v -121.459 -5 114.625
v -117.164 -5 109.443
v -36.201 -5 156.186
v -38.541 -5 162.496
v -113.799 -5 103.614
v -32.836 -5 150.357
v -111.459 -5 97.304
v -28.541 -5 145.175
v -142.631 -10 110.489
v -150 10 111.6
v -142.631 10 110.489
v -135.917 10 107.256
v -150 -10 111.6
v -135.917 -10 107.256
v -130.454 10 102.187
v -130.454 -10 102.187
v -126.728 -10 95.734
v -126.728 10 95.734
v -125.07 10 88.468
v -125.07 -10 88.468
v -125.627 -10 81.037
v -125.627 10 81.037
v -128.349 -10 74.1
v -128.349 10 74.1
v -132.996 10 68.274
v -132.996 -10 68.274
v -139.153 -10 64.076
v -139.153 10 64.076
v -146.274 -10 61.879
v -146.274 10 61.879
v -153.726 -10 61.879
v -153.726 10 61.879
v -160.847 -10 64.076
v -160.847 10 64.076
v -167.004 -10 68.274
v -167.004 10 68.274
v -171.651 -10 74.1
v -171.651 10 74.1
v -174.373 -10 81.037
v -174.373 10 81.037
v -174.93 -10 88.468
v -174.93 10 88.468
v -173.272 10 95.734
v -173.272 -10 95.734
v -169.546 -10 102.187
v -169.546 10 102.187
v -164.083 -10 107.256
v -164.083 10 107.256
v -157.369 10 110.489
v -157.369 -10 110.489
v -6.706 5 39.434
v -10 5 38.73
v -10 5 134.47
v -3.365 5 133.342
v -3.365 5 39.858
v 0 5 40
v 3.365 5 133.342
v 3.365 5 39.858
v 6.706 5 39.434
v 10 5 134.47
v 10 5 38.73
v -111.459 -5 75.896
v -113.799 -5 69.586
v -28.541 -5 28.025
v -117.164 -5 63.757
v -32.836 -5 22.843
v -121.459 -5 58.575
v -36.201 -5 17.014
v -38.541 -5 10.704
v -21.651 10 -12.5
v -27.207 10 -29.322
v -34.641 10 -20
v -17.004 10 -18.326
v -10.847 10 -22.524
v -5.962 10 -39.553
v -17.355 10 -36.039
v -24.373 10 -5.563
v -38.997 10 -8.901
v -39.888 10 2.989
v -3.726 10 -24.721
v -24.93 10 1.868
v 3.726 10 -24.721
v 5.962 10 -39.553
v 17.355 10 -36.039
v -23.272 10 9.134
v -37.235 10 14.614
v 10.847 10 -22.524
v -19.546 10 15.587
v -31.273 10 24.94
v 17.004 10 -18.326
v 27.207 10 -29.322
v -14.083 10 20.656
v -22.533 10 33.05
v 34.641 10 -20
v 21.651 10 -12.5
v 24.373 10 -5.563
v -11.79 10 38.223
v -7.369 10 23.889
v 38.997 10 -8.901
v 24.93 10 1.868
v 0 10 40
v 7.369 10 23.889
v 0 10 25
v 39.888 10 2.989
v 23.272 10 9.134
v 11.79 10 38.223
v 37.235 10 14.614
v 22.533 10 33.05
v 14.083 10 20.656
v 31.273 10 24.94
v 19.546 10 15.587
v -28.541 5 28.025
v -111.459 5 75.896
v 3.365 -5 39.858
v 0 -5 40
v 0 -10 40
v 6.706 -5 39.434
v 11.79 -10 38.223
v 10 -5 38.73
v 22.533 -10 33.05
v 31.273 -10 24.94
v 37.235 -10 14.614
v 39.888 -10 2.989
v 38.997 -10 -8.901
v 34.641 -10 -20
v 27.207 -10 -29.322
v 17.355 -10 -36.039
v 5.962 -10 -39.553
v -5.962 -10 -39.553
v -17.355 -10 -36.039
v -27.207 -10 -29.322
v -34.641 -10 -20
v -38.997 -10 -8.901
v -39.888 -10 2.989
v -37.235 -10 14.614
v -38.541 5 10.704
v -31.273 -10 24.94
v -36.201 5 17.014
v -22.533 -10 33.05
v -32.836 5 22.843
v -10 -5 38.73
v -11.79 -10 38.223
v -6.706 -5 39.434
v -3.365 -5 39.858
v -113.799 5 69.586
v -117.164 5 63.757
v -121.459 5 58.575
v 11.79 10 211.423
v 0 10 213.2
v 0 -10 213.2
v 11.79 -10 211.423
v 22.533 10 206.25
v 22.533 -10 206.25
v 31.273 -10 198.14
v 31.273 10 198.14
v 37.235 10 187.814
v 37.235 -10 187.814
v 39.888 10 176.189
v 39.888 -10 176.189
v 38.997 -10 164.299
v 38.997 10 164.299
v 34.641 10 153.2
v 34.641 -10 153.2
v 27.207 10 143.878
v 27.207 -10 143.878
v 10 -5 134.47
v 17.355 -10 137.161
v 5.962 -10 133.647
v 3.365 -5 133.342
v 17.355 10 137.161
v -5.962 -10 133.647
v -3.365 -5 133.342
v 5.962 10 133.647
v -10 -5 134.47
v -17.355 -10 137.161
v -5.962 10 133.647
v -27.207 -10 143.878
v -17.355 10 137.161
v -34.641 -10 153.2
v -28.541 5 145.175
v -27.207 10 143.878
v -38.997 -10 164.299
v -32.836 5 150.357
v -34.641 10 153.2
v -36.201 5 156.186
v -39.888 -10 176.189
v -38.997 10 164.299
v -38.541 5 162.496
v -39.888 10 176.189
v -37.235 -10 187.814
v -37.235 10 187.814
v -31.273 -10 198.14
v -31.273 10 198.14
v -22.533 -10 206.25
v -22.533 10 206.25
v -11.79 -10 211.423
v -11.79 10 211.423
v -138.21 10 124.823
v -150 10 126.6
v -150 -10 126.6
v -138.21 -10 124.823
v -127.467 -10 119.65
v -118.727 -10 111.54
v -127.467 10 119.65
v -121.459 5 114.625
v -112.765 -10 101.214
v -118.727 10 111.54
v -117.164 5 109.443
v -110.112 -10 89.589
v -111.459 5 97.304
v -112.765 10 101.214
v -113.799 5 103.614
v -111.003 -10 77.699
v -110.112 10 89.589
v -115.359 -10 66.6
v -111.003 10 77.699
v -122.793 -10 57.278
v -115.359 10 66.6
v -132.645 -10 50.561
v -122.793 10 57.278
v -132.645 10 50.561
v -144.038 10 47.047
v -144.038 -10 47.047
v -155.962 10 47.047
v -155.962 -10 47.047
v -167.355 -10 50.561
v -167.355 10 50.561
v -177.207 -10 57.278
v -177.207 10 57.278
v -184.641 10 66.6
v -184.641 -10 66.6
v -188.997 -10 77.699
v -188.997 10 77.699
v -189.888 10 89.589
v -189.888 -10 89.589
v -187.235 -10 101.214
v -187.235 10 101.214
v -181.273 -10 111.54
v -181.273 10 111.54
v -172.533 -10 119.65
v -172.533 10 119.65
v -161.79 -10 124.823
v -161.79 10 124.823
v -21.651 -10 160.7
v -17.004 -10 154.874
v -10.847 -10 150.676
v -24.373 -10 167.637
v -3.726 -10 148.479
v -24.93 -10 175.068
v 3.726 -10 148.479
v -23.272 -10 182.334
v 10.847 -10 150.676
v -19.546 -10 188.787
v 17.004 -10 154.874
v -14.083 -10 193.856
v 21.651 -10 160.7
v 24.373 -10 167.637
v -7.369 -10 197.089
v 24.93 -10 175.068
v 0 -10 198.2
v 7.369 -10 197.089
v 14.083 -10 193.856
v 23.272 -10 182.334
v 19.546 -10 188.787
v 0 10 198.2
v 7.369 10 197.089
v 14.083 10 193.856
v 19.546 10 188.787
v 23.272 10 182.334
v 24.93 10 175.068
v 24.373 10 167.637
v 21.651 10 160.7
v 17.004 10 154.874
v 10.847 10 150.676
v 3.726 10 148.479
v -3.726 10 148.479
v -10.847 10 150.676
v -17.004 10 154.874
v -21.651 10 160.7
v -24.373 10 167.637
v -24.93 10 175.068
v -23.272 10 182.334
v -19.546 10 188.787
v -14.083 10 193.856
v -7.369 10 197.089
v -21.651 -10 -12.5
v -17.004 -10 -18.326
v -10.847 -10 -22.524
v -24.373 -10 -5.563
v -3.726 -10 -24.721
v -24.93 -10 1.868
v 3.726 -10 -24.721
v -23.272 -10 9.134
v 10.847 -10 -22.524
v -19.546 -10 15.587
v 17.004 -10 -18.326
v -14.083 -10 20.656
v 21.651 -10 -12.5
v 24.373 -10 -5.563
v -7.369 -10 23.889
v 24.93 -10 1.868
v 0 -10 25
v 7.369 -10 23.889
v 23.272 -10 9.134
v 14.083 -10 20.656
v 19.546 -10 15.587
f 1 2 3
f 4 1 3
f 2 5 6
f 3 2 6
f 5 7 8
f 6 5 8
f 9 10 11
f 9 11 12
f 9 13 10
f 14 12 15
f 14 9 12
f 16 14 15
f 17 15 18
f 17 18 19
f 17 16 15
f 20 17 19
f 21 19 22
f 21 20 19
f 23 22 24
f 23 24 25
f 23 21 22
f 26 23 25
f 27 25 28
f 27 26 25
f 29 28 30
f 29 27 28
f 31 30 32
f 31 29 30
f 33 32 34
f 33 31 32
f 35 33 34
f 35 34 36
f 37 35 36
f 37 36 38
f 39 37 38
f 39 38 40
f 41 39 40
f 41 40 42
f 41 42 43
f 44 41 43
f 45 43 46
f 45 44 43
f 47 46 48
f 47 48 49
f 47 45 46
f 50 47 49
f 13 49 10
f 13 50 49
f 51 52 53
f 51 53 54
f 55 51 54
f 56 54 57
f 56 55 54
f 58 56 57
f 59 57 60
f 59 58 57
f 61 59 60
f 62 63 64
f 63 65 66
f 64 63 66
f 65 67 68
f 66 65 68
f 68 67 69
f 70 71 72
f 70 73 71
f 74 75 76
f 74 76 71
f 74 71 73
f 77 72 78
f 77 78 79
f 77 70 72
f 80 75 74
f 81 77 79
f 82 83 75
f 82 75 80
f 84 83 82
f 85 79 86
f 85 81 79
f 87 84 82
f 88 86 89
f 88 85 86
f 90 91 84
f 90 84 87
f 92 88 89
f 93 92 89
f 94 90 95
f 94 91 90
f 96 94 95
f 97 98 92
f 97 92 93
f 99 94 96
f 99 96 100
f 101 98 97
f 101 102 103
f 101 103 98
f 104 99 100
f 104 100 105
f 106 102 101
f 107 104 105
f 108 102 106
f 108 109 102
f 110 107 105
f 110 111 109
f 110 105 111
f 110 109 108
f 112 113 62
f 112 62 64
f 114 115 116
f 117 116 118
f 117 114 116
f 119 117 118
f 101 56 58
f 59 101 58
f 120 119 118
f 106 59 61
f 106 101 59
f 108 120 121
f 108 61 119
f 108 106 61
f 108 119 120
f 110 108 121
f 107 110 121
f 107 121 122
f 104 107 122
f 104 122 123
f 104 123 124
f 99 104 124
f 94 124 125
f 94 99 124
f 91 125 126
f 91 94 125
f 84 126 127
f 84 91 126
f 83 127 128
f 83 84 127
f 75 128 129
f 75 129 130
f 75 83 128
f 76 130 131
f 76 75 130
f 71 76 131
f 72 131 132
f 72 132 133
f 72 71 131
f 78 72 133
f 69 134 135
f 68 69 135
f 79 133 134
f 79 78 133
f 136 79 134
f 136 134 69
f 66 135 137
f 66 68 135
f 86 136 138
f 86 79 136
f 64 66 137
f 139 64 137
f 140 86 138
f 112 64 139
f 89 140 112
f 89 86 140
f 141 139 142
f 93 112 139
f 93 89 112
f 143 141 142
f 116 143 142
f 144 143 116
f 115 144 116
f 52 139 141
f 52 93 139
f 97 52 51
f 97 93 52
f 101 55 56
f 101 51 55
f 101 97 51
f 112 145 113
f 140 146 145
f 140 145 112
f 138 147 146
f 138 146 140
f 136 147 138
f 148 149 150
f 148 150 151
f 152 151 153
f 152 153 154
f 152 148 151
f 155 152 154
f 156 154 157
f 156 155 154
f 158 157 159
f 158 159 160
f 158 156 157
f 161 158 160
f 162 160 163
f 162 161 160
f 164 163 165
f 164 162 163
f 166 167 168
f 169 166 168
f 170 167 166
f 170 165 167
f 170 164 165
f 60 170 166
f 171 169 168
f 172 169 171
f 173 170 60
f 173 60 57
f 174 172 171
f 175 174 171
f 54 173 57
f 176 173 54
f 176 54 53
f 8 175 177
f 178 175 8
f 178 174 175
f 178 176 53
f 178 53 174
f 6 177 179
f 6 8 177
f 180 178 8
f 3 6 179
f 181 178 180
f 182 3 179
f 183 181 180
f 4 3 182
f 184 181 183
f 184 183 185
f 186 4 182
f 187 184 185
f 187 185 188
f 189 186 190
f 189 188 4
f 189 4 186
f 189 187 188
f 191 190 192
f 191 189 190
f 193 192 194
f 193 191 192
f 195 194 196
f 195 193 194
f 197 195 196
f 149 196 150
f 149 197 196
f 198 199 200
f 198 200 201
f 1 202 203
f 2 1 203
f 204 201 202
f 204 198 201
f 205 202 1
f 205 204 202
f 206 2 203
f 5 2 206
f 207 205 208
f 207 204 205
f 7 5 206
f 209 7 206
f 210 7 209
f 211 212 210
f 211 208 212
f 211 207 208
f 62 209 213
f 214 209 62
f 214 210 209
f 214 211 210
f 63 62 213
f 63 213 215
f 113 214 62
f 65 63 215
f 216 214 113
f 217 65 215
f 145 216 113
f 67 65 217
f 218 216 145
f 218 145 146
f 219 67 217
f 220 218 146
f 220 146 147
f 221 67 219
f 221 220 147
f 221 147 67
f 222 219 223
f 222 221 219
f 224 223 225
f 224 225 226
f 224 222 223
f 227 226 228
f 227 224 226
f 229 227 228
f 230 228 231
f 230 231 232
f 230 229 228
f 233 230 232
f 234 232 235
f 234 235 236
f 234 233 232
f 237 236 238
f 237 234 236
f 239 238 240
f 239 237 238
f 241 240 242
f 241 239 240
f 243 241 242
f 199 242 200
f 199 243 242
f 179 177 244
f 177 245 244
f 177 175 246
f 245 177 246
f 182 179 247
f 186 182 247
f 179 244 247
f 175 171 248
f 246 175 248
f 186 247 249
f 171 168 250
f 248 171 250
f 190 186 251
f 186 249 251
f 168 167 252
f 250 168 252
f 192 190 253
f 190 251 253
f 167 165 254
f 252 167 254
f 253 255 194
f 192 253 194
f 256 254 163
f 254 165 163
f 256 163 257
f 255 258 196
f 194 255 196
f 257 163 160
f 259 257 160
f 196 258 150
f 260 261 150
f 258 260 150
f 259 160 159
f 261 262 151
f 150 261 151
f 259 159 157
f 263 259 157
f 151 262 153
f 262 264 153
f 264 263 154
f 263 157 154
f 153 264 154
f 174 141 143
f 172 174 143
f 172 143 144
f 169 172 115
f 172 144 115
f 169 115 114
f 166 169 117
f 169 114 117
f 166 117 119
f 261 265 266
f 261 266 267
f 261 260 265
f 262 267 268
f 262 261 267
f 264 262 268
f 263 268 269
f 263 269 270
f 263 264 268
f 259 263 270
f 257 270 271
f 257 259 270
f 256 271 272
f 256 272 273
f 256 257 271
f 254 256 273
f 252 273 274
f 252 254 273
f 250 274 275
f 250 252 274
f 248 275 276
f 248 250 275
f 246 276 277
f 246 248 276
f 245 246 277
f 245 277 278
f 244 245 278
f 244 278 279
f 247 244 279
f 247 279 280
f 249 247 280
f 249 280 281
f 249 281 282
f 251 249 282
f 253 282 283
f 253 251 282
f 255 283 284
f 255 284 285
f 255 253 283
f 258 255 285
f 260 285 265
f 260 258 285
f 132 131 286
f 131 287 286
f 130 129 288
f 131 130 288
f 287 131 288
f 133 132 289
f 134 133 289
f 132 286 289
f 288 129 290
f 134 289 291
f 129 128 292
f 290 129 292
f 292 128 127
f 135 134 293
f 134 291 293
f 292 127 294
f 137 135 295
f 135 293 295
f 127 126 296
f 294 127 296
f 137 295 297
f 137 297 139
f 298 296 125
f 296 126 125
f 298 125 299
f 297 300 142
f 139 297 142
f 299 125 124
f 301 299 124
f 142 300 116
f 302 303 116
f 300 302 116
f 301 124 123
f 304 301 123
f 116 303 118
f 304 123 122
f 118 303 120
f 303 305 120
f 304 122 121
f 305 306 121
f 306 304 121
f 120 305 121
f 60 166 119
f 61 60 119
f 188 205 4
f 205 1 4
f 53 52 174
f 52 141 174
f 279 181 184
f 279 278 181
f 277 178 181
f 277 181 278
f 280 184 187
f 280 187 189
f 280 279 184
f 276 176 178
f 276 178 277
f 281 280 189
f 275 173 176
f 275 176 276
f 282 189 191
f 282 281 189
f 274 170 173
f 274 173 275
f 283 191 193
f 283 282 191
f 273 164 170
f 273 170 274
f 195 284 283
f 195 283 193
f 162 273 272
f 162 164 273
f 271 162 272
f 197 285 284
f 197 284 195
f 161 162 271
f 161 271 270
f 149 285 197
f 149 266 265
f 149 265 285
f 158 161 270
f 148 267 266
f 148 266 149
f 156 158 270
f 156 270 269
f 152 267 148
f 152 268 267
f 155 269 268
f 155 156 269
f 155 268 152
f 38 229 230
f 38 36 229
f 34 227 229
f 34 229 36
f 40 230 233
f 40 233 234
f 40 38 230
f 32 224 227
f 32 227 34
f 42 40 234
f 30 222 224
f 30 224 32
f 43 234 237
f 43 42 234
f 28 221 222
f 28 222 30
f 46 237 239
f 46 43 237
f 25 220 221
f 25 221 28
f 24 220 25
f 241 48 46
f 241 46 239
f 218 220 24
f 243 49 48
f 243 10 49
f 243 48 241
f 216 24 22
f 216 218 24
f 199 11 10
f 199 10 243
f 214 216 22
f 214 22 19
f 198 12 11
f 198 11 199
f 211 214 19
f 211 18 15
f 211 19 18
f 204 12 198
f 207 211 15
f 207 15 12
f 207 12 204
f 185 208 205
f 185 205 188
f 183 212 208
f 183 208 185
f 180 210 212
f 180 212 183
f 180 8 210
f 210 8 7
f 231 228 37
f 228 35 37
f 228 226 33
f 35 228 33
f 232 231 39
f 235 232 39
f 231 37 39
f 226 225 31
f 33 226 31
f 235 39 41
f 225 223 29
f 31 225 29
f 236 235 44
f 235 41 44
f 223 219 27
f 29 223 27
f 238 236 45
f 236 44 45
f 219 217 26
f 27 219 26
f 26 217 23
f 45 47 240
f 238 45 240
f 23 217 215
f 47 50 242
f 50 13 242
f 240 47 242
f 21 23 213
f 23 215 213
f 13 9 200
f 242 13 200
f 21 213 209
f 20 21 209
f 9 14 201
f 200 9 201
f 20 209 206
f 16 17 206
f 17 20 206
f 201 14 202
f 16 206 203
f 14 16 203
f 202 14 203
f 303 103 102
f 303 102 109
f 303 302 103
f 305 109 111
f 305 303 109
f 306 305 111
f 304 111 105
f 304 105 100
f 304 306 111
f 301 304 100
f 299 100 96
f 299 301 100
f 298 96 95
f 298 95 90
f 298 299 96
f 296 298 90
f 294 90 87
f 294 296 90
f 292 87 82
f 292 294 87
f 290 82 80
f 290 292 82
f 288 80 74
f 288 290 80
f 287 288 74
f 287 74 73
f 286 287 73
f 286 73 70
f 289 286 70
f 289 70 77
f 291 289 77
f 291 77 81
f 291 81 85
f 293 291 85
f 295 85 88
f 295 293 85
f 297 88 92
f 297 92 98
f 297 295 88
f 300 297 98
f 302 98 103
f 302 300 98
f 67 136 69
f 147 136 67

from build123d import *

# Parameters (mm, degrees)
SKETCH1_R             = 40
SKETCH1_R_2           = 25
BOSS_EXTRUDE1_DEPTH   = 10
BOSS_EXTRUDE1_2_DEPTH = 10
BOSS_EXTRUDE1_3_DEPTH = 10
BOSS_EXTRUDE2_DEPTH   = 5


with BuildPart() as part:
    # Sketch1 → Boss-Extrude1 (new, symmetric)
    with BuildSketch(Plane(origin=(0, 0, 0), x_dir=(1, 0, 0), z_dir=(0, 1, 0))):
        with Locations((-150, -86.6)):
            Circle(SKETCH1_R)
        with Locations((-150, -86.6)):
            Circle(SKETCH1_R_2, mode=Mode.SUBTRACT)
    extrude(amount=BOSS_EXTRUDE1_DEPTH, both=True)



with BuildPart() as body_2:
    # Sketch1 → Boss-Extrude1 2 (new, symmetric)
    with BuildSketch(Plane(origin=(0, 0, 0), x_dir=(1, 0, 0), z_dir=(0, 1, 0))):
        Circle(SKETCH1_R)
        Circle(SKETCH1_R_2, mode=Mode.SUBTRACT)
    extrude(amount=BOSS_EXTRUDE1_2_DEPTH, both=True)


with BuildPart() as body_3:
    # Sketch1 → Boss-Extrude1 3 (new, symmetric)
    with BuildSketch(Plane(origin=(0, 0, 0), x_dir=(1, 0, 0), z_dir=(0, 1, 0))):
        with Locations((0, -173.2)):
            Circle(SKETCH1_R)
        with Locations((0, -173.2)):
            Circle(SKETCH1_R_2, mode=Mode.SUBTRACT)
    extrude(amount=BOSS_EXTRUDE1_3_DEPTH, both=True)


with BuildPart() as part_1:
    add(part.part)

    add(body_2.part)  # Boss-Extrude2 merges body 2

    add(body_3.part)  # Boss-Extrude2 merges body 3
    # Sketch1<3> → Boss-Extrude2 (add, symmetric)
    with BuildSketch(Plane(origin=(0, 0, 0), x_dir=(1, 0, 0), z_dir=(0, 1, 0))):
        with BuildLine():
            Line((-38.54115563, -10.704173145), (-121.458624364, -58.575191761))
            ThreePointArc((-121.458624364, -58.575191761), (-115.358729812, -66.600440011), (-111.45884437, -75.895826855))
            Line((-111.45884437, -75.895826855), (-28.541375636, -28.024808239))
            ThreePointArc((-28.541375636, -28.024808239), (-34.641270188, -19.999559989), (-38.54115563, -10.704173145))
        make_face()
        with BuildLine():
            ThreePointArc((-111.45884437, -97.304173145), (-115.358729812, -106.599559989), (-121.458624364, -114.624808239))
            Line((-121.458624364, -114.624808239), (-38.54115563, -162.495826855))
            ThreePointArc((-38.54115563, -162.495826855), (-34.641270188, -153.200440011), (-28.541375636, -145.175191761))
            Line((-28.541375636, -145.175191761), (-111.45884437, -97.304173145))
        make_face()
        with BuildLine():
            Line((10, -134.470166538), (10, -38.729833462))
            ThreePointArc((10, -38.729833462), (0, -40), (-10, -38.729833462))
            Line((-10, -38.729833462), (-10, -134.470166538))
            ThreePointArc((-10, -134.470166538), (0, -133.2), (10, -134.470166538))
        make_face()
    extrude(amount=BOSS_EXTRUDE2_DEPTH, both=True)


solid = part_1.part
